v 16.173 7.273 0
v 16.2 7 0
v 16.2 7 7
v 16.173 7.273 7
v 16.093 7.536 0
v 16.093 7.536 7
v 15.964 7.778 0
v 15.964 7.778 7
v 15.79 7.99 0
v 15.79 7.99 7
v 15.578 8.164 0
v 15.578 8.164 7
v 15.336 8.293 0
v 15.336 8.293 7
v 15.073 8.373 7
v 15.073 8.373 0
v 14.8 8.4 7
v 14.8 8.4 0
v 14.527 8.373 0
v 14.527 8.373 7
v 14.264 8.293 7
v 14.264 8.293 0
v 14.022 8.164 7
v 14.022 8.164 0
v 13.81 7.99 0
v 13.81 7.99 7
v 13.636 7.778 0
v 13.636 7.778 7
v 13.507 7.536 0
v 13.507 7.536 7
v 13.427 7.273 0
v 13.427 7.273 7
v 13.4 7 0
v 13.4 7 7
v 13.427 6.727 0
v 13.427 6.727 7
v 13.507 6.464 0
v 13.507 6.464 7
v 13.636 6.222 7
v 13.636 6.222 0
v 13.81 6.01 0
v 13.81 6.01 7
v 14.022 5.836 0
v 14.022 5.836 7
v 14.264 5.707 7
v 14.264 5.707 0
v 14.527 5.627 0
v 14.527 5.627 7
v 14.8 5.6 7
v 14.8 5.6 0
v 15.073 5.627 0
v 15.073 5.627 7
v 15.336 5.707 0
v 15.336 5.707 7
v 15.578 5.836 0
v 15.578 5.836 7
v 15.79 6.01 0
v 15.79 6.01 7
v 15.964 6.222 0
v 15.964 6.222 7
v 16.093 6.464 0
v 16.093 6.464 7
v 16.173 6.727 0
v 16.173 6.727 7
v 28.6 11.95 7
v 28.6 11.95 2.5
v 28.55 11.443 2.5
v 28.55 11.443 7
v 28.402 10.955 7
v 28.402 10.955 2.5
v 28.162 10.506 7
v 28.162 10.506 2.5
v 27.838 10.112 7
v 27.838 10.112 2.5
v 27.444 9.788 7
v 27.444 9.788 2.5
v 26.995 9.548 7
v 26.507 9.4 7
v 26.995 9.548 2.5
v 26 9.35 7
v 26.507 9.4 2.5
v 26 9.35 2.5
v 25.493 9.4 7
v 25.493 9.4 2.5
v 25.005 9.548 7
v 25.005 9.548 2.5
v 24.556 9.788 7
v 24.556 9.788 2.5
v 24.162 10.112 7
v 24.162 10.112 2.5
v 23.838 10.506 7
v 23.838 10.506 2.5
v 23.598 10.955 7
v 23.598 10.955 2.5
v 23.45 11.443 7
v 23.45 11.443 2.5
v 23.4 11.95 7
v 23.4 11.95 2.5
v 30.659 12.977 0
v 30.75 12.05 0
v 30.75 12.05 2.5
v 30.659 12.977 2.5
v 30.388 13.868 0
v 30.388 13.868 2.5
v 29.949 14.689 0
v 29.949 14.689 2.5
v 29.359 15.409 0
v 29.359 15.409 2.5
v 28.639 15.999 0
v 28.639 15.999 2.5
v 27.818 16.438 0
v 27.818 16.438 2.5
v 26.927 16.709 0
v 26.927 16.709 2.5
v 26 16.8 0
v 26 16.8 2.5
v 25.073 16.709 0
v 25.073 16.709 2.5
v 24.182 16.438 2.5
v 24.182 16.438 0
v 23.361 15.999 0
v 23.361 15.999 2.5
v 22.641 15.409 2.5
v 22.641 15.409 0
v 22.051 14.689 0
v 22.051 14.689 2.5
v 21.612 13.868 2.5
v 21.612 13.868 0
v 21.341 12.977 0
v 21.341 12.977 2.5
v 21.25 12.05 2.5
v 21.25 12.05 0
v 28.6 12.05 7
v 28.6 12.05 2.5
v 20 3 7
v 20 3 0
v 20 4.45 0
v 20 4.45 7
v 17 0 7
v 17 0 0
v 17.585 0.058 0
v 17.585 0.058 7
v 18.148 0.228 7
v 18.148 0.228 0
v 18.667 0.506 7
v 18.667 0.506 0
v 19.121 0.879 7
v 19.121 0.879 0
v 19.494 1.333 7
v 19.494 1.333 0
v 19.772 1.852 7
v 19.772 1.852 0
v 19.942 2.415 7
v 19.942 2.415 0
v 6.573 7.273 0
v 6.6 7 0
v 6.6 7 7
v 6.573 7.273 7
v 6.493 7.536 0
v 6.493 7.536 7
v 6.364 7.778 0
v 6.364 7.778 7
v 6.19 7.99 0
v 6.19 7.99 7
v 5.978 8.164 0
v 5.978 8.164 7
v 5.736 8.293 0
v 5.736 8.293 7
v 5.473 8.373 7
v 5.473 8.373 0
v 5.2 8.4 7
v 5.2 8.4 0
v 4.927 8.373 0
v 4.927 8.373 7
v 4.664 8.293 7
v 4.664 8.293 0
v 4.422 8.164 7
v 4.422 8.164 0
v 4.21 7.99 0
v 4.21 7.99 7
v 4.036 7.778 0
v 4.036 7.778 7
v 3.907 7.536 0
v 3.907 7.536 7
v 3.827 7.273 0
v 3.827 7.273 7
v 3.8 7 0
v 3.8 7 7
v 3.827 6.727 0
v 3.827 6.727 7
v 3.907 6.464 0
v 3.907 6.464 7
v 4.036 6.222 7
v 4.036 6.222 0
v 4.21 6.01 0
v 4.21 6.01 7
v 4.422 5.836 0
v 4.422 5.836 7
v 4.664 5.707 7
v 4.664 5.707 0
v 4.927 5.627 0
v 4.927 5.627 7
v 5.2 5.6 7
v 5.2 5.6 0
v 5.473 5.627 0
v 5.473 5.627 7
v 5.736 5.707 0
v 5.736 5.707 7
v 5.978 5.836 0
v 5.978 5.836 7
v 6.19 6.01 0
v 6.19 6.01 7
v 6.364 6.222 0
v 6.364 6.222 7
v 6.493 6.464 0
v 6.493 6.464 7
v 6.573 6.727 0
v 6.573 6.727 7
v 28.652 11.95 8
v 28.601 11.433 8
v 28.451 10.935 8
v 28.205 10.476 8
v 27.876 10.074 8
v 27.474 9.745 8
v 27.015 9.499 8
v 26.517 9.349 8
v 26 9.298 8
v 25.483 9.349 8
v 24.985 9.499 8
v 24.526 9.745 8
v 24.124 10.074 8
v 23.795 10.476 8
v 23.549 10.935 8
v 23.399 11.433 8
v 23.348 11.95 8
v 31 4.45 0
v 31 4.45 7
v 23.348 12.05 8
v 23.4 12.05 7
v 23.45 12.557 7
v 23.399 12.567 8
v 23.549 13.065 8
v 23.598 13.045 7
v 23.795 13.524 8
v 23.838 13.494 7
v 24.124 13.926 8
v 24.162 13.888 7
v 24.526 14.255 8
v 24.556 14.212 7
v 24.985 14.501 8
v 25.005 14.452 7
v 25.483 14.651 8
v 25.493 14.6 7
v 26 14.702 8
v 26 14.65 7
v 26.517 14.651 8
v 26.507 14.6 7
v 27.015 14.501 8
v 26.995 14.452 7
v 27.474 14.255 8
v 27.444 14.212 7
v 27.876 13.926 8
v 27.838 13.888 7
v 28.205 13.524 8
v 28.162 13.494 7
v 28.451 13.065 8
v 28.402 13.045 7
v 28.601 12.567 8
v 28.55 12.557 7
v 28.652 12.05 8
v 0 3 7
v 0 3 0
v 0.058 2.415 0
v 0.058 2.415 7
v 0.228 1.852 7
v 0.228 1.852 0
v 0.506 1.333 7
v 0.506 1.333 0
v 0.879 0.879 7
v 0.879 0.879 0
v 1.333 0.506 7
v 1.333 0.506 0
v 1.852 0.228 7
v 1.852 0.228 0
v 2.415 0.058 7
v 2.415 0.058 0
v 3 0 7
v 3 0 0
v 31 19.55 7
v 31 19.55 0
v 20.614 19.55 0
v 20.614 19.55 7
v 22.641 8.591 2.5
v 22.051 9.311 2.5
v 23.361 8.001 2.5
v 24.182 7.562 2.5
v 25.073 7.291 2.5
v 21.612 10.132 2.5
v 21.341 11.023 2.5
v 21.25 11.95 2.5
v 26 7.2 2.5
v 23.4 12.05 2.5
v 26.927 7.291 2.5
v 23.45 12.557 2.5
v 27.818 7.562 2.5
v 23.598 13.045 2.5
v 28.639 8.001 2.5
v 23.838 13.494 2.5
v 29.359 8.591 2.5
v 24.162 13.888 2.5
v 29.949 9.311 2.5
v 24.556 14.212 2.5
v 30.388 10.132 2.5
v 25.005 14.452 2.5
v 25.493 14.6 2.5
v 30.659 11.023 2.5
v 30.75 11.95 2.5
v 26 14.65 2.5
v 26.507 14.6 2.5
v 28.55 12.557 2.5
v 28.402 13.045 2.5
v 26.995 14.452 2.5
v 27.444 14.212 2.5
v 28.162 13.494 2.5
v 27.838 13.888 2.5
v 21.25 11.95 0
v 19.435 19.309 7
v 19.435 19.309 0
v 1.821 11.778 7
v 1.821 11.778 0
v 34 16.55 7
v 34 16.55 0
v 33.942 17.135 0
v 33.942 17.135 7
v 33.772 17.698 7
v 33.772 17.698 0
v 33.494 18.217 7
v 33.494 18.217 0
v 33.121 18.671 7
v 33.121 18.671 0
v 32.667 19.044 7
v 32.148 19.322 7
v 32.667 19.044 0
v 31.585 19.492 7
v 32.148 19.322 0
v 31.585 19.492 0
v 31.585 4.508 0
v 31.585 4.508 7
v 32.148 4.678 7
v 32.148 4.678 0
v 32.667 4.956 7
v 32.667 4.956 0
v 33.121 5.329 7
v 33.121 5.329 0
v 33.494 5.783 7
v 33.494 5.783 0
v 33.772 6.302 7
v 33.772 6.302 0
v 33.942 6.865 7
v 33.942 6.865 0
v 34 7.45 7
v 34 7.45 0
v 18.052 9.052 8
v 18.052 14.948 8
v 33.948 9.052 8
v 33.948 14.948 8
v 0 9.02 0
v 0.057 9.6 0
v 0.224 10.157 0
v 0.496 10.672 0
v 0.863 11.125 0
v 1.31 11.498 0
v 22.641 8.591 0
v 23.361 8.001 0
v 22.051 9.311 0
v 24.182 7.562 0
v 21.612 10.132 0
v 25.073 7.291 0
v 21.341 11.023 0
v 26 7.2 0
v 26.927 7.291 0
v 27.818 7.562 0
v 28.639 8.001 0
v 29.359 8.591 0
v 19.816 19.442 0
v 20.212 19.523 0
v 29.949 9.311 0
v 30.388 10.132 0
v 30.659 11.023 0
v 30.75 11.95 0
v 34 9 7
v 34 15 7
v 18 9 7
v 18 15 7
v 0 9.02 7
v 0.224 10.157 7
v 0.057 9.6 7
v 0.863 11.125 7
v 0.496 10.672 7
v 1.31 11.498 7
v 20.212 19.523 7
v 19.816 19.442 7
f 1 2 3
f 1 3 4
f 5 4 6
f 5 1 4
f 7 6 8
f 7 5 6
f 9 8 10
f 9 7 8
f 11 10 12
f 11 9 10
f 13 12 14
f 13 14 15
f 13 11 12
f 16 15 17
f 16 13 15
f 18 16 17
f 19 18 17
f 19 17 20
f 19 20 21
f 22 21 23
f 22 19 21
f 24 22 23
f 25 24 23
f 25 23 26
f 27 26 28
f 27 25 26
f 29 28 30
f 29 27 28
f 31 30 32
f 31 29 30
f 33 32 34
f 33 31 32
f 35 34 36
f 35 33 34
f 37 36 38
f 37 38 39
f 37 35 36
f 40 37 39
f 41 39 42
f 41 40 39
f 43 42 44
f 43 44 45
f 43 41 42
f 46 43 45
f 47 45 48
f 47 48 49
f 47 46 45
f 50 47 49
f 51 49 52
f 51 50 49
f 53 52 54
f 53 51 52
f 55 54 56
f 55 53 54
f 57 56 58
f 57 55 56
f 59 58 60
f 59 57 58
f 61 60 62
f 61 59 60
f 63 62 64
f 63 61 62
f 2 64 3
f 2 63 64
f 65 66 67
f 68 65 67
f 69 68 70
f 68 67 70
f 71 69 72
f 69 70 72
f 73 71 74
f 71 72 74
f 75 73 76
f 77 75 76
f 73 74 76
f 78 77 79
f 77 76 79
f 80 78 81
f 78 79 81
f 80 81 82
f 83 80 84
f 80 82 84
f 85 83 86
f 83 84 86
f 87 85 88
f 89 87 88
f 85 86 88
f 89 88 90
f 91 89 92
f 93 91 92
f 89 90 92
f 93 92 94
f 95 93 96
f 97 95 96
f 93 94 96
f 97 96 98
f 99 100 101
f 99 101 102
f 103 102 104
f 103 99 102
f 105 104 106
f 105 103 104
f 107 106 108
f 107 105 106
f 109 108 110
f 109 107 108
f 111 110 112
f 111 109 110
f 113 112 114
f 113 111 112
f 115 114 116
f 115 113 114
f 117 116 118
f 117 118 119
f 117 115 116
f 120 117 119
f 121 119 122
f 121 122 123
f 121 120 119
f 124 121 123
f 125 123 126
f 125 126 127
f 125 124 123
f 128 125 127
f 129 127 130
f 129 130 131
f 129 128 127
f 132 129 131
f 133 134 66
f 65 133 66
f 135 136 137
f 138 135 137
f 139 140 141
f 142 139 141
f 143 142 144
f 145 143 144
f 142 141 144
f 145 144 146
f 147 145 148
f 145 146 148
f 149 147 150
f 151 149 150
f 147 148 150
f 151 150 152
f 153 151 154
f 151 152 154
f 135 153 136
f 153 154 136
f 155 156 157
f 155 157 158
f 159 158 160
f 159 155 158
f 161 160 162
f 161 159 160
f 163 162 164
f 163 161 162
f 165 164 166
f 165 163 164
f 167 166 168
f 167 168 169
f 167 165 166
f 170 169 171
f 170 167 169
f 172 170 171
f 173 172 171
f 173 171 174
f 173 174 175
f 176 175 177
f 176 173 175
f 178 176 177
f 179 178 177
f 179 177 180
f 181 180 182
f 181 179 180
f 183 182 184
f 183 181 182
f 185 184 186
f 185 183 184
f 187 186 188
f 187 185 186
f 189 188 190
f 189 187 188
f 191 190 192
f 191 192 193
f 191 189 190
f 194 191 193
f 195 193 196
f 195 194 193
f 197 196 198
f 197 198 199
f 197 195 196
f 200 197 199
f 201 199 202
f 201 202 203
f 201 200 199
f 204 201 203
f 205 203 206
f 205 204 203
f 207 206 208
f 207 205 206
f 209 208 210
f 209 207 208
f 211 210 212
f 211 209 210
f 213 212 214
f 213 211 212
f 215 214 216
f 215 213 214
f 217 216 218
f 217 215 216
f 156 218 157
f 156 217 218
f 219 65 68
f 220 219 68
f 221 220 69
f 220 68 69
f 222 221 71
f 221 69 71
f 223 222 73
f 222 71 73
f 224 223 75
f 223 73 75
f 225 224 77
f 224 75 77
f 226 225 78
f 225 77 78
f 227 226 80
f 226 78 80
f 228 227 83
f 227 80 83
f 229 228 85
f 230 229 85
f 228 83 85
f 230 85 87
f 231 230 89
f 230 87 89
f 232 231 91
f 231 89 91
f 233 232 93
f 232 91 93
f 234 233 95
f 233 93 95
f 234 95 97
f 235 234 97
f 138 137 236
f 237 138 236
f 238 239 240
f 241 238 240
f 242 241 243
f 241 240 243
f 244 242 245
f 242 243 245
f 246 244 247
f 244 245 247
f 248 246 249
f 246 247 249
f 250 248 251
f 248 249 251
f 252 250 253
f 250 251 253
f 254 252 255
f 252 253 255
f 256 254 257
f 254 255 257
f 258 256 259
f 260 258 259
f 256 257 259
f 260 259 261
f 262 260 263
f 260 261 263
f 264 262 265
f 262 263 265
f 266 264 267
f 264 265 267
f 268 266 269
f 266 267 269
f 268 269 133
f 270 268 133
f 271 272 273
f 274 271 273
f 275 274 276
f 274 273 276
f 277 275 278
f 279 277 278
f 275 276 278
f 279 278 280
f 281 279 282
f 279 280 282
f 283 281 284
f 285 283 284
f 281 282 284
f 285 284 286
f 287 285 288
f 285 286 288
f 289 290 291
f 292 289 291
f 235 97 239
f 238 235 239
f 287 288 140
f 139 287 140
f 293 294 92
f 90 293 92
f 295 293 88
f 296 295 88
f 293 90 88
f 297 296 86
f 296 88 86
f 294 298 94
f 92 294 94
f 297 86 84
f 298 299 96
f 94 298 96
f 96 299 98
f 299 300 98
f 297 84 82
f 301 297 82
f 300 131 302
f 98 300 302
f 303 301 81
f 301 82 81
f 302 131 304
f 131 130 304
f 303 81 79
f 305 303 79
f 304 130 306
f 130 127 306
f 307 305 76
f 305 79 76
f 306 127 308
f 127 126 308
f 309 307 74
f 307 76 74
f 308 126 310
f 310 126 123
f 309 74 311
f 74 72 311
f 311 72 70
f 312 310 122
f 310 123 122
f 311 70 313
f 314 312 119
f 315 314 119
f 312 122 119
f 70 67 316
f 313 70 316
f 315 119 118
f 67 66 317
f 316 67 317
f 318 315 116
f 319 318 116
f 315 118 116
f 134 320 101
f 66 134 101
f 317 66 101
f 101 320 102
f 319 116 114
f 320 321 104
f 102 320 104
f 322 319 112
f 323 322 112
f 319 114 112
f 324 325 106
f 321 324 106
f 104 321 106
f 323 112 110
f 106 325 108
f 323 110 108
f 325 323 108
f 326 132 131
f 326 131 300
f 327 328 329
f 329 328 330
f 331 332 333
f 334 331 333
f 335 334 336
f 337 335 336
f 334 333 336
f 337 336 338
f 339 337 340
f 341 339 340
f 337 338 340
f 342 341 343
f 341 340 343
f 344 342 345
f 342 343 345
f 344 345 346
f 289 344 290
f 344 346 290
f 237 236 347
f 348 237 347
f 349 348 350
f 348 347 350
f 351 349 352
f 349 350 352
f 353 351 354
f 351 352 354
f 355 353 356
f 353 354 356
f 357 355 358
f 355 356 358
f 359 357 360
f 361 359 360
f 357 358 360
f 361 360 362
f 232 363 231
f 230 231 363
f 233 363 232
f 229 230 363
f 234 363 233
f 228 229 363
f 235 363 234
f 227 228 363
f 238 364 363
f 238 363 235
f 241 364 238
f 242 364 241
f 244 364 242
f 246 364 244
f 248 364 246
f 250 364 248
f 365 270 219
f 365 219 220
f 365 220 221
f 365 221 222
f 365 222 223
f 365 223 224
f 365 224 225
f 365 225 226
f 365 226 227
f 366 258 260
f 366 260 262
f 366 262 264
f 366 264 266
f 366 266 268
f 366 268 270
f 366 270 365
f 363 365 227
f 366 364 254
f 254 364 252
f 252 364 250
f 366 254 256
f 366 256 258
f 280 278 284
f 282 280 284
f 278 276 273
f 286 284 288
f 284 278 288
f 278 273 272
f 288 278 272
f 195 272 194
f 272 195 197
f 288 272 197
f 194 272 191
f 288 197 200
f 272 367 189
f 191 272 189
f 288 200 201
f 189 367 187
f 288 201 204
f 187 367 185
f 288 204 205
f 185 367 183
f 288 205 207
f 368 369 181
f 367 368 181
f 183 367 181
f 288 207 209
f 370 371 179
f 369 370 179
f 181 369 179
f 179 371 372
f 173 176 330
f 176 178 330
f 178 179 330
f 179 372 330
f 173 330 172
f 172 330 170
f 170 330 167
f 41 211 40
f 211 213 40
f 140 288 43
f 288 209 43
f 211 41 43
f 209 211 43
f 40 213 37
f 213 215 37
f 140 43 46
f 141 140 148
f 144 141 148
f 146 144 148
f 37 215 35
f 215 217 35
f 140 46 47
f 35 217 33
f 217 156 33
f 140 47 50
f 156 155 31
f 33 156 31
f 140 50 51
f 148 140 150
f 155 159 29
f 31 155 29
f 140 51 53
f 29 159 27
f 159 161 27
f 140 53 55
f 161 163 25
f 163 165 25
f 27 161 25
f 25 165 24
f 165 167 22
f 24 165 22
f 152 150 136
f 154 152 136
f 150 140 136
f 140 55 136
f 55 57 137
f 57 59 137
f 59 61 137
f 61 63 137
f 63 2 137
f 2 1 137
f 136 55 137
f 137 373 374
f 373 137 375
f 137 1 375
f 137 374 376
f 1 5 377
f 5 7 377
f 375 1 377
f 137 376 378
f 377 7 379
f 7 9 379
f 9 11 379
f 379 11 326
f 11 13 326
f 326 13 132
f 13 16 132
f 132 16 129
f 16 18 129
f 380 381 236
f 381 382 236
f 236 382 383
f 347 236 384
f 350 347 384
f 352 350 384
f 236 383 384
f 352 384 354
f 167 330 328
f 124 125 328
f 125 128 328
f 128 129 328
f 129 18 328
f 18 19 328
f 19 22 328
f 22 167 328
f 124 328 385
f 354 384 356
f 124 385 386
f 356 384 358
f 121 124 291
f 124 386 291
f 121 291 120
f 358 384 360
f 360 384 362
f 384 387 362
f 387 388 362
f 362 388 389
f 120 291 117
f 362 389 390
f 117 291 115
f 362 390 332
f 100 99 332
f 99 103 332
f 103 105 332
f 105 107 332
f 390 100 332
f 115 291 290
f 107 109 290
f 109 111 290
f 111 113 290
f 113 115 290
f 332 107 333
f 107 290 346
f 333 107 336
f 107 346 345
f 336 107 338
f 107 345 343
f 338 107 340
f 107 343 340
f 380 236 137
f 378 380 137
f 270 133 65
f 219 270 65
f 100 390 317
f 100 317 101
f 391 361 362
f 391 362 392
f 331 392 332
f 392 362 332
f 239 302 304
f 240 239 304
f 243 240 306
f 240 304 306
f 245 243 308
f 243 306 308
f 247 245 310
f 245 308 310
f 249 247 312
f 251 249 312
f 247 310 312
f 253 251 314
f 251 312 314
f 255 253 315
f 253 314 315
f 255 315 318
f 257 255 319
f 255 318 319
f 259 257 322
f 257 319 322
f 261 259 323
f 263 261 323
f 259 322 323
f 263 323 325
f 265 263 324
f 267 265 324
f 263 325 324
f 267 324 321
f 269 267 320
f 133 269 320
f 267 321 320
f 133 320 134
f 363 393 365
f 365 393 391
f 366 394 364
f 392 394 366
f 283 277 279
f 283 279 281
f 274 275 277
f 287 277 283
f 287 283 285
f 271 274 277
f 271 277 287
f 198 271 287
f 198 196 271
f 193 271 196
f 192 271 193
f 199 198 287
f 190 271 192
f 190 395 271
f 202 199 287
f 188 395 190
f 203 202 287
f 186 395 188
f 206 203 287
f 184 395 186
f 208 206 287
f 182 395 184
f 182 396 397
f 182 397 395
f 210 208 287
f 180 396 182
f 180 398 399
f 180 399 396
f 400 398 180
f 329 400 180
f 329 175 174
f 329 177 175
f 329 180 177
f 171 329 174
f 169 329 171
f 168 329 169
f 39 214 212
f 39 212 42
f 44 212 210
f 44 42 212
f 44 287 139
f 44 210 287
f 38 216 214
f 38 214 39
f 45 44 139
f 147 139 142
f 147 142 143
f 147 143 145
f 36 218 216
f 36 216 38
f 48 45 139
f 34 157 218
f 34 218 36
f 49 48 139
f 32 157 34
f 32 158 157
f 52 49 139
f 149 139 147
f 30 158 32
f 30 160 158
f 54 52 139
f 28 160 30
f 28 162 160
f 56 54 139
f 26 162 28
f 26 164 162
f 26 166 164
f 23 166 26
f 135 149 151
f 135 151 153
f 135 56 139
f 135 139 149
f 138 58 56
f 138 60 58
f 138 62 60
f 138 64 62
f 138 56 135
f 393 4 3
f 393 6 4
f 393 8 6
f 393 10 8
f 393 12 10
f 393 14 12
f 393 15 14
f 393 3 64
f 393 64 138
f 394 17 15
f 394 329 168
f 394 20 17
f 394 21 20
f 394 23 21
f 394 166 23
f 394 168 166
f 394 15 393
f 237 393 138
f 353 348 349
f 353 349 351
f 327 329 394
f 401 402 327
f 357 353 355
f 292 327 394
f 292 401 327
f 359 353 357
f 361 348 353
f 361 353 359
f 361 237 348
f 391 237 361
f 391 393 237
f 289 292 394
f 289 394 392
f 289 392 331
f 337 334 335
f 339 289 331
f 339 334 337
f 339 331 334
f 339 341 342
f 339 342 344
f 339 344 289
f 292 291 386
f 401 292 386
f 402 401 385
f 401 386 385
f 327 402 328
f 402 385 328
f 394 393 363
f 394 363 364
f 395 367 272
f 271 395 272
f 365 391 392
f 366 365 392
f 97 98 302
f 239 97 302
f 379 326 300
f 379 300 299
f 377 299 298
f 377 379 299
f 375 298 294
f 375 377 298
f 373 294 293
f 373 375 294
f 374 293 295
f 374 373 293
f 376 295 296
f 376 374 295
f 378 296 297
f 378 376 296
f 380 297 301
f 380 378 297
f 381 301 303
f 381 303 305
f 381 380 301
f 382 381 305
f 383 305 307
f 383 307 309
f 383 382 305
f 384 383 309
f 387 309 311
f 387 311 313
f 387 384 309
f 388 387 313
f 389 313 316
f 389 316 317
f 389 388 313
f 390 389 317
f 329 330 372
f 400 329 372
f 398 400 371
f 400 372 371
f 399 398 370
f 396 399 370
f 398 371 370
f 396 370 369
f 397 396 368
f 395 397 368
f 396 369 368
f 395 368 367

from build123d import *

# Parameters (mm, degrees)
SKETCH1_R           = 1.4
BOSS_EXTRUDE1_DEPTH = 7
CUT_EXTRUDE1_DEPTH  = 2.5
SKETCH3_W           = 16
SKETCH3_H           = 6
BOSS_EXTRUDE2_DEPTH = 1
BOSS_EXTRUDE2_DRAFT = 3


with BuildPart() as part:
    # Sketch1 → Boss-Extrude1 (new body)
    with BuildSketch(Plane.XY):
        with BuildLine():
            Line((3, 0), (17, 0))
            ThreePointArc((17, 0), (19.121320344, 0.878679656), (20, 3))
            Line((20, 3), (20, 4.45))
            Line((20, 4.45), (31, 4.45))
            ThreePointArc((31, 4.45), (33.121320344, 5.328679656), (34, 7.45))
            Line((34, 7.45), (34, 16.55))
            ThreePointArc((34, 16.55), (33.121320344, 18.671320344), (31, 19.55))
            Line((31, 19.55), (20.614357727, 19.55))
            ThreePointArc((20.614357727, 19.55), (20.012490717, 19.489005972), (19.435097237, 19.308504069))
            Line((19.435097237, 19.308504069), (1.820739511, 11.778366141))
            ThreePointArc((1.820739511, 11.778366141), (0.496224704, 10.672468881), (0, 9.019862072))
            Line((0, 9.019862072), (0, 3))
            ThreePointArc((0, 3), (0.878679656, 0.878679656), (3, 0))
        make_face()
        with Locations((5.2, 7)):
            Circle(SKETCH1_R, mode=Mode.SUBTRACT)
        with Locations((14.8, 7)):
            Circle(SKETCH1_R, mode=Mode.SUBTRACT)
        with BuildLine():
            Line((28.6, 12.05), (28.6, 11.95))
            ThreePointArc((28.6, 11.95), (26, 9.35), (23.4, 11.95))
            Line((23.4, 11.95), (23.4, 12.05))
            ThreePointArc((23.4, 12.05), (26, 14.65), (28.6, 12.05))
        make_face(mode=Mode.SUBTRACT)
    extrude(amount=BOSS_EXTRUDE1_DEPTH)

    # Sketch2 → Cut-Extrude1 (cut)
    with BuildSketch(Plane(origin=(0, 0, 0), x_dir=(-1, 0, 0), z_dir=(0, 0, -1))):
        with BuildLine():
            Line((-21.25, 12.05), (-21.25, 11.95))
            ThreePointArc((-21.25, 11.95), (-26, 7.2), (-30.75, 11.95))
            Line((-30.75, 11.95), (-30.75, 12.05))
            ThreePointArc((-30.75, 12.05), (-26, 16.8), (-21.25, 12.05))
        make_face()
    extrude(amount=-CUT_EXTRUDE1_DEPTH, mode=Mode.SUBTRACT)


with BuildPart() as boss_extrude2_tool:
    # Sketch3 → Boss-Extrude2 (with draft: the straight prism first)
    with BuildSketch(Plane.XY.offset(7)):
        with Locations((26, 12)):
            Rectangle(SKETCH3_W, SKETCH3_H)
        with BuildLine():
            Line((28.6, 12.05), (28.6, 11.95))
            ThreePointArc((28.6, 11.95), (26, 9.35), (23.4, 11.95))
            Line((23.4, 11.95), (23.4, 12.05))
            ThreePointArc((23.4, 12.05), (26, 14.65), (28.6, 12.05))
        make_face(mode=Mode.SUBTRACT)
    extrude(amount=BOSS_EXTRUDE2_DEPTH)
    # Boss-Extrude2: the draft: its side faces are tilted about the plane it starts from
    boss_extrude2_sides = [boss_extrude2_tool.faces().sort_by_distance(p)[0] for p in [
        (26, 15, 7.5),
        (18, 12, 7.5),
        (26, 9, 7.5),
        (34, 12, 7.5),
        (26, 14.65, 7.5),
        (28.6, 12, 7.5),
        (26, 9.35, 7.5),
        (23.4, 12, 7.5),
    ]]
    draft(boss_extrude2_sides, Plane.XY.offset(7), BOSS_EXTRUDE2_DRAFT)


with BuildPart() as part_1:
    add(part.part)

    # Boss-Extrude2: add boss_extrude2_tool
    add(boss_extrude2_tool.part)


solid = part_1.part
